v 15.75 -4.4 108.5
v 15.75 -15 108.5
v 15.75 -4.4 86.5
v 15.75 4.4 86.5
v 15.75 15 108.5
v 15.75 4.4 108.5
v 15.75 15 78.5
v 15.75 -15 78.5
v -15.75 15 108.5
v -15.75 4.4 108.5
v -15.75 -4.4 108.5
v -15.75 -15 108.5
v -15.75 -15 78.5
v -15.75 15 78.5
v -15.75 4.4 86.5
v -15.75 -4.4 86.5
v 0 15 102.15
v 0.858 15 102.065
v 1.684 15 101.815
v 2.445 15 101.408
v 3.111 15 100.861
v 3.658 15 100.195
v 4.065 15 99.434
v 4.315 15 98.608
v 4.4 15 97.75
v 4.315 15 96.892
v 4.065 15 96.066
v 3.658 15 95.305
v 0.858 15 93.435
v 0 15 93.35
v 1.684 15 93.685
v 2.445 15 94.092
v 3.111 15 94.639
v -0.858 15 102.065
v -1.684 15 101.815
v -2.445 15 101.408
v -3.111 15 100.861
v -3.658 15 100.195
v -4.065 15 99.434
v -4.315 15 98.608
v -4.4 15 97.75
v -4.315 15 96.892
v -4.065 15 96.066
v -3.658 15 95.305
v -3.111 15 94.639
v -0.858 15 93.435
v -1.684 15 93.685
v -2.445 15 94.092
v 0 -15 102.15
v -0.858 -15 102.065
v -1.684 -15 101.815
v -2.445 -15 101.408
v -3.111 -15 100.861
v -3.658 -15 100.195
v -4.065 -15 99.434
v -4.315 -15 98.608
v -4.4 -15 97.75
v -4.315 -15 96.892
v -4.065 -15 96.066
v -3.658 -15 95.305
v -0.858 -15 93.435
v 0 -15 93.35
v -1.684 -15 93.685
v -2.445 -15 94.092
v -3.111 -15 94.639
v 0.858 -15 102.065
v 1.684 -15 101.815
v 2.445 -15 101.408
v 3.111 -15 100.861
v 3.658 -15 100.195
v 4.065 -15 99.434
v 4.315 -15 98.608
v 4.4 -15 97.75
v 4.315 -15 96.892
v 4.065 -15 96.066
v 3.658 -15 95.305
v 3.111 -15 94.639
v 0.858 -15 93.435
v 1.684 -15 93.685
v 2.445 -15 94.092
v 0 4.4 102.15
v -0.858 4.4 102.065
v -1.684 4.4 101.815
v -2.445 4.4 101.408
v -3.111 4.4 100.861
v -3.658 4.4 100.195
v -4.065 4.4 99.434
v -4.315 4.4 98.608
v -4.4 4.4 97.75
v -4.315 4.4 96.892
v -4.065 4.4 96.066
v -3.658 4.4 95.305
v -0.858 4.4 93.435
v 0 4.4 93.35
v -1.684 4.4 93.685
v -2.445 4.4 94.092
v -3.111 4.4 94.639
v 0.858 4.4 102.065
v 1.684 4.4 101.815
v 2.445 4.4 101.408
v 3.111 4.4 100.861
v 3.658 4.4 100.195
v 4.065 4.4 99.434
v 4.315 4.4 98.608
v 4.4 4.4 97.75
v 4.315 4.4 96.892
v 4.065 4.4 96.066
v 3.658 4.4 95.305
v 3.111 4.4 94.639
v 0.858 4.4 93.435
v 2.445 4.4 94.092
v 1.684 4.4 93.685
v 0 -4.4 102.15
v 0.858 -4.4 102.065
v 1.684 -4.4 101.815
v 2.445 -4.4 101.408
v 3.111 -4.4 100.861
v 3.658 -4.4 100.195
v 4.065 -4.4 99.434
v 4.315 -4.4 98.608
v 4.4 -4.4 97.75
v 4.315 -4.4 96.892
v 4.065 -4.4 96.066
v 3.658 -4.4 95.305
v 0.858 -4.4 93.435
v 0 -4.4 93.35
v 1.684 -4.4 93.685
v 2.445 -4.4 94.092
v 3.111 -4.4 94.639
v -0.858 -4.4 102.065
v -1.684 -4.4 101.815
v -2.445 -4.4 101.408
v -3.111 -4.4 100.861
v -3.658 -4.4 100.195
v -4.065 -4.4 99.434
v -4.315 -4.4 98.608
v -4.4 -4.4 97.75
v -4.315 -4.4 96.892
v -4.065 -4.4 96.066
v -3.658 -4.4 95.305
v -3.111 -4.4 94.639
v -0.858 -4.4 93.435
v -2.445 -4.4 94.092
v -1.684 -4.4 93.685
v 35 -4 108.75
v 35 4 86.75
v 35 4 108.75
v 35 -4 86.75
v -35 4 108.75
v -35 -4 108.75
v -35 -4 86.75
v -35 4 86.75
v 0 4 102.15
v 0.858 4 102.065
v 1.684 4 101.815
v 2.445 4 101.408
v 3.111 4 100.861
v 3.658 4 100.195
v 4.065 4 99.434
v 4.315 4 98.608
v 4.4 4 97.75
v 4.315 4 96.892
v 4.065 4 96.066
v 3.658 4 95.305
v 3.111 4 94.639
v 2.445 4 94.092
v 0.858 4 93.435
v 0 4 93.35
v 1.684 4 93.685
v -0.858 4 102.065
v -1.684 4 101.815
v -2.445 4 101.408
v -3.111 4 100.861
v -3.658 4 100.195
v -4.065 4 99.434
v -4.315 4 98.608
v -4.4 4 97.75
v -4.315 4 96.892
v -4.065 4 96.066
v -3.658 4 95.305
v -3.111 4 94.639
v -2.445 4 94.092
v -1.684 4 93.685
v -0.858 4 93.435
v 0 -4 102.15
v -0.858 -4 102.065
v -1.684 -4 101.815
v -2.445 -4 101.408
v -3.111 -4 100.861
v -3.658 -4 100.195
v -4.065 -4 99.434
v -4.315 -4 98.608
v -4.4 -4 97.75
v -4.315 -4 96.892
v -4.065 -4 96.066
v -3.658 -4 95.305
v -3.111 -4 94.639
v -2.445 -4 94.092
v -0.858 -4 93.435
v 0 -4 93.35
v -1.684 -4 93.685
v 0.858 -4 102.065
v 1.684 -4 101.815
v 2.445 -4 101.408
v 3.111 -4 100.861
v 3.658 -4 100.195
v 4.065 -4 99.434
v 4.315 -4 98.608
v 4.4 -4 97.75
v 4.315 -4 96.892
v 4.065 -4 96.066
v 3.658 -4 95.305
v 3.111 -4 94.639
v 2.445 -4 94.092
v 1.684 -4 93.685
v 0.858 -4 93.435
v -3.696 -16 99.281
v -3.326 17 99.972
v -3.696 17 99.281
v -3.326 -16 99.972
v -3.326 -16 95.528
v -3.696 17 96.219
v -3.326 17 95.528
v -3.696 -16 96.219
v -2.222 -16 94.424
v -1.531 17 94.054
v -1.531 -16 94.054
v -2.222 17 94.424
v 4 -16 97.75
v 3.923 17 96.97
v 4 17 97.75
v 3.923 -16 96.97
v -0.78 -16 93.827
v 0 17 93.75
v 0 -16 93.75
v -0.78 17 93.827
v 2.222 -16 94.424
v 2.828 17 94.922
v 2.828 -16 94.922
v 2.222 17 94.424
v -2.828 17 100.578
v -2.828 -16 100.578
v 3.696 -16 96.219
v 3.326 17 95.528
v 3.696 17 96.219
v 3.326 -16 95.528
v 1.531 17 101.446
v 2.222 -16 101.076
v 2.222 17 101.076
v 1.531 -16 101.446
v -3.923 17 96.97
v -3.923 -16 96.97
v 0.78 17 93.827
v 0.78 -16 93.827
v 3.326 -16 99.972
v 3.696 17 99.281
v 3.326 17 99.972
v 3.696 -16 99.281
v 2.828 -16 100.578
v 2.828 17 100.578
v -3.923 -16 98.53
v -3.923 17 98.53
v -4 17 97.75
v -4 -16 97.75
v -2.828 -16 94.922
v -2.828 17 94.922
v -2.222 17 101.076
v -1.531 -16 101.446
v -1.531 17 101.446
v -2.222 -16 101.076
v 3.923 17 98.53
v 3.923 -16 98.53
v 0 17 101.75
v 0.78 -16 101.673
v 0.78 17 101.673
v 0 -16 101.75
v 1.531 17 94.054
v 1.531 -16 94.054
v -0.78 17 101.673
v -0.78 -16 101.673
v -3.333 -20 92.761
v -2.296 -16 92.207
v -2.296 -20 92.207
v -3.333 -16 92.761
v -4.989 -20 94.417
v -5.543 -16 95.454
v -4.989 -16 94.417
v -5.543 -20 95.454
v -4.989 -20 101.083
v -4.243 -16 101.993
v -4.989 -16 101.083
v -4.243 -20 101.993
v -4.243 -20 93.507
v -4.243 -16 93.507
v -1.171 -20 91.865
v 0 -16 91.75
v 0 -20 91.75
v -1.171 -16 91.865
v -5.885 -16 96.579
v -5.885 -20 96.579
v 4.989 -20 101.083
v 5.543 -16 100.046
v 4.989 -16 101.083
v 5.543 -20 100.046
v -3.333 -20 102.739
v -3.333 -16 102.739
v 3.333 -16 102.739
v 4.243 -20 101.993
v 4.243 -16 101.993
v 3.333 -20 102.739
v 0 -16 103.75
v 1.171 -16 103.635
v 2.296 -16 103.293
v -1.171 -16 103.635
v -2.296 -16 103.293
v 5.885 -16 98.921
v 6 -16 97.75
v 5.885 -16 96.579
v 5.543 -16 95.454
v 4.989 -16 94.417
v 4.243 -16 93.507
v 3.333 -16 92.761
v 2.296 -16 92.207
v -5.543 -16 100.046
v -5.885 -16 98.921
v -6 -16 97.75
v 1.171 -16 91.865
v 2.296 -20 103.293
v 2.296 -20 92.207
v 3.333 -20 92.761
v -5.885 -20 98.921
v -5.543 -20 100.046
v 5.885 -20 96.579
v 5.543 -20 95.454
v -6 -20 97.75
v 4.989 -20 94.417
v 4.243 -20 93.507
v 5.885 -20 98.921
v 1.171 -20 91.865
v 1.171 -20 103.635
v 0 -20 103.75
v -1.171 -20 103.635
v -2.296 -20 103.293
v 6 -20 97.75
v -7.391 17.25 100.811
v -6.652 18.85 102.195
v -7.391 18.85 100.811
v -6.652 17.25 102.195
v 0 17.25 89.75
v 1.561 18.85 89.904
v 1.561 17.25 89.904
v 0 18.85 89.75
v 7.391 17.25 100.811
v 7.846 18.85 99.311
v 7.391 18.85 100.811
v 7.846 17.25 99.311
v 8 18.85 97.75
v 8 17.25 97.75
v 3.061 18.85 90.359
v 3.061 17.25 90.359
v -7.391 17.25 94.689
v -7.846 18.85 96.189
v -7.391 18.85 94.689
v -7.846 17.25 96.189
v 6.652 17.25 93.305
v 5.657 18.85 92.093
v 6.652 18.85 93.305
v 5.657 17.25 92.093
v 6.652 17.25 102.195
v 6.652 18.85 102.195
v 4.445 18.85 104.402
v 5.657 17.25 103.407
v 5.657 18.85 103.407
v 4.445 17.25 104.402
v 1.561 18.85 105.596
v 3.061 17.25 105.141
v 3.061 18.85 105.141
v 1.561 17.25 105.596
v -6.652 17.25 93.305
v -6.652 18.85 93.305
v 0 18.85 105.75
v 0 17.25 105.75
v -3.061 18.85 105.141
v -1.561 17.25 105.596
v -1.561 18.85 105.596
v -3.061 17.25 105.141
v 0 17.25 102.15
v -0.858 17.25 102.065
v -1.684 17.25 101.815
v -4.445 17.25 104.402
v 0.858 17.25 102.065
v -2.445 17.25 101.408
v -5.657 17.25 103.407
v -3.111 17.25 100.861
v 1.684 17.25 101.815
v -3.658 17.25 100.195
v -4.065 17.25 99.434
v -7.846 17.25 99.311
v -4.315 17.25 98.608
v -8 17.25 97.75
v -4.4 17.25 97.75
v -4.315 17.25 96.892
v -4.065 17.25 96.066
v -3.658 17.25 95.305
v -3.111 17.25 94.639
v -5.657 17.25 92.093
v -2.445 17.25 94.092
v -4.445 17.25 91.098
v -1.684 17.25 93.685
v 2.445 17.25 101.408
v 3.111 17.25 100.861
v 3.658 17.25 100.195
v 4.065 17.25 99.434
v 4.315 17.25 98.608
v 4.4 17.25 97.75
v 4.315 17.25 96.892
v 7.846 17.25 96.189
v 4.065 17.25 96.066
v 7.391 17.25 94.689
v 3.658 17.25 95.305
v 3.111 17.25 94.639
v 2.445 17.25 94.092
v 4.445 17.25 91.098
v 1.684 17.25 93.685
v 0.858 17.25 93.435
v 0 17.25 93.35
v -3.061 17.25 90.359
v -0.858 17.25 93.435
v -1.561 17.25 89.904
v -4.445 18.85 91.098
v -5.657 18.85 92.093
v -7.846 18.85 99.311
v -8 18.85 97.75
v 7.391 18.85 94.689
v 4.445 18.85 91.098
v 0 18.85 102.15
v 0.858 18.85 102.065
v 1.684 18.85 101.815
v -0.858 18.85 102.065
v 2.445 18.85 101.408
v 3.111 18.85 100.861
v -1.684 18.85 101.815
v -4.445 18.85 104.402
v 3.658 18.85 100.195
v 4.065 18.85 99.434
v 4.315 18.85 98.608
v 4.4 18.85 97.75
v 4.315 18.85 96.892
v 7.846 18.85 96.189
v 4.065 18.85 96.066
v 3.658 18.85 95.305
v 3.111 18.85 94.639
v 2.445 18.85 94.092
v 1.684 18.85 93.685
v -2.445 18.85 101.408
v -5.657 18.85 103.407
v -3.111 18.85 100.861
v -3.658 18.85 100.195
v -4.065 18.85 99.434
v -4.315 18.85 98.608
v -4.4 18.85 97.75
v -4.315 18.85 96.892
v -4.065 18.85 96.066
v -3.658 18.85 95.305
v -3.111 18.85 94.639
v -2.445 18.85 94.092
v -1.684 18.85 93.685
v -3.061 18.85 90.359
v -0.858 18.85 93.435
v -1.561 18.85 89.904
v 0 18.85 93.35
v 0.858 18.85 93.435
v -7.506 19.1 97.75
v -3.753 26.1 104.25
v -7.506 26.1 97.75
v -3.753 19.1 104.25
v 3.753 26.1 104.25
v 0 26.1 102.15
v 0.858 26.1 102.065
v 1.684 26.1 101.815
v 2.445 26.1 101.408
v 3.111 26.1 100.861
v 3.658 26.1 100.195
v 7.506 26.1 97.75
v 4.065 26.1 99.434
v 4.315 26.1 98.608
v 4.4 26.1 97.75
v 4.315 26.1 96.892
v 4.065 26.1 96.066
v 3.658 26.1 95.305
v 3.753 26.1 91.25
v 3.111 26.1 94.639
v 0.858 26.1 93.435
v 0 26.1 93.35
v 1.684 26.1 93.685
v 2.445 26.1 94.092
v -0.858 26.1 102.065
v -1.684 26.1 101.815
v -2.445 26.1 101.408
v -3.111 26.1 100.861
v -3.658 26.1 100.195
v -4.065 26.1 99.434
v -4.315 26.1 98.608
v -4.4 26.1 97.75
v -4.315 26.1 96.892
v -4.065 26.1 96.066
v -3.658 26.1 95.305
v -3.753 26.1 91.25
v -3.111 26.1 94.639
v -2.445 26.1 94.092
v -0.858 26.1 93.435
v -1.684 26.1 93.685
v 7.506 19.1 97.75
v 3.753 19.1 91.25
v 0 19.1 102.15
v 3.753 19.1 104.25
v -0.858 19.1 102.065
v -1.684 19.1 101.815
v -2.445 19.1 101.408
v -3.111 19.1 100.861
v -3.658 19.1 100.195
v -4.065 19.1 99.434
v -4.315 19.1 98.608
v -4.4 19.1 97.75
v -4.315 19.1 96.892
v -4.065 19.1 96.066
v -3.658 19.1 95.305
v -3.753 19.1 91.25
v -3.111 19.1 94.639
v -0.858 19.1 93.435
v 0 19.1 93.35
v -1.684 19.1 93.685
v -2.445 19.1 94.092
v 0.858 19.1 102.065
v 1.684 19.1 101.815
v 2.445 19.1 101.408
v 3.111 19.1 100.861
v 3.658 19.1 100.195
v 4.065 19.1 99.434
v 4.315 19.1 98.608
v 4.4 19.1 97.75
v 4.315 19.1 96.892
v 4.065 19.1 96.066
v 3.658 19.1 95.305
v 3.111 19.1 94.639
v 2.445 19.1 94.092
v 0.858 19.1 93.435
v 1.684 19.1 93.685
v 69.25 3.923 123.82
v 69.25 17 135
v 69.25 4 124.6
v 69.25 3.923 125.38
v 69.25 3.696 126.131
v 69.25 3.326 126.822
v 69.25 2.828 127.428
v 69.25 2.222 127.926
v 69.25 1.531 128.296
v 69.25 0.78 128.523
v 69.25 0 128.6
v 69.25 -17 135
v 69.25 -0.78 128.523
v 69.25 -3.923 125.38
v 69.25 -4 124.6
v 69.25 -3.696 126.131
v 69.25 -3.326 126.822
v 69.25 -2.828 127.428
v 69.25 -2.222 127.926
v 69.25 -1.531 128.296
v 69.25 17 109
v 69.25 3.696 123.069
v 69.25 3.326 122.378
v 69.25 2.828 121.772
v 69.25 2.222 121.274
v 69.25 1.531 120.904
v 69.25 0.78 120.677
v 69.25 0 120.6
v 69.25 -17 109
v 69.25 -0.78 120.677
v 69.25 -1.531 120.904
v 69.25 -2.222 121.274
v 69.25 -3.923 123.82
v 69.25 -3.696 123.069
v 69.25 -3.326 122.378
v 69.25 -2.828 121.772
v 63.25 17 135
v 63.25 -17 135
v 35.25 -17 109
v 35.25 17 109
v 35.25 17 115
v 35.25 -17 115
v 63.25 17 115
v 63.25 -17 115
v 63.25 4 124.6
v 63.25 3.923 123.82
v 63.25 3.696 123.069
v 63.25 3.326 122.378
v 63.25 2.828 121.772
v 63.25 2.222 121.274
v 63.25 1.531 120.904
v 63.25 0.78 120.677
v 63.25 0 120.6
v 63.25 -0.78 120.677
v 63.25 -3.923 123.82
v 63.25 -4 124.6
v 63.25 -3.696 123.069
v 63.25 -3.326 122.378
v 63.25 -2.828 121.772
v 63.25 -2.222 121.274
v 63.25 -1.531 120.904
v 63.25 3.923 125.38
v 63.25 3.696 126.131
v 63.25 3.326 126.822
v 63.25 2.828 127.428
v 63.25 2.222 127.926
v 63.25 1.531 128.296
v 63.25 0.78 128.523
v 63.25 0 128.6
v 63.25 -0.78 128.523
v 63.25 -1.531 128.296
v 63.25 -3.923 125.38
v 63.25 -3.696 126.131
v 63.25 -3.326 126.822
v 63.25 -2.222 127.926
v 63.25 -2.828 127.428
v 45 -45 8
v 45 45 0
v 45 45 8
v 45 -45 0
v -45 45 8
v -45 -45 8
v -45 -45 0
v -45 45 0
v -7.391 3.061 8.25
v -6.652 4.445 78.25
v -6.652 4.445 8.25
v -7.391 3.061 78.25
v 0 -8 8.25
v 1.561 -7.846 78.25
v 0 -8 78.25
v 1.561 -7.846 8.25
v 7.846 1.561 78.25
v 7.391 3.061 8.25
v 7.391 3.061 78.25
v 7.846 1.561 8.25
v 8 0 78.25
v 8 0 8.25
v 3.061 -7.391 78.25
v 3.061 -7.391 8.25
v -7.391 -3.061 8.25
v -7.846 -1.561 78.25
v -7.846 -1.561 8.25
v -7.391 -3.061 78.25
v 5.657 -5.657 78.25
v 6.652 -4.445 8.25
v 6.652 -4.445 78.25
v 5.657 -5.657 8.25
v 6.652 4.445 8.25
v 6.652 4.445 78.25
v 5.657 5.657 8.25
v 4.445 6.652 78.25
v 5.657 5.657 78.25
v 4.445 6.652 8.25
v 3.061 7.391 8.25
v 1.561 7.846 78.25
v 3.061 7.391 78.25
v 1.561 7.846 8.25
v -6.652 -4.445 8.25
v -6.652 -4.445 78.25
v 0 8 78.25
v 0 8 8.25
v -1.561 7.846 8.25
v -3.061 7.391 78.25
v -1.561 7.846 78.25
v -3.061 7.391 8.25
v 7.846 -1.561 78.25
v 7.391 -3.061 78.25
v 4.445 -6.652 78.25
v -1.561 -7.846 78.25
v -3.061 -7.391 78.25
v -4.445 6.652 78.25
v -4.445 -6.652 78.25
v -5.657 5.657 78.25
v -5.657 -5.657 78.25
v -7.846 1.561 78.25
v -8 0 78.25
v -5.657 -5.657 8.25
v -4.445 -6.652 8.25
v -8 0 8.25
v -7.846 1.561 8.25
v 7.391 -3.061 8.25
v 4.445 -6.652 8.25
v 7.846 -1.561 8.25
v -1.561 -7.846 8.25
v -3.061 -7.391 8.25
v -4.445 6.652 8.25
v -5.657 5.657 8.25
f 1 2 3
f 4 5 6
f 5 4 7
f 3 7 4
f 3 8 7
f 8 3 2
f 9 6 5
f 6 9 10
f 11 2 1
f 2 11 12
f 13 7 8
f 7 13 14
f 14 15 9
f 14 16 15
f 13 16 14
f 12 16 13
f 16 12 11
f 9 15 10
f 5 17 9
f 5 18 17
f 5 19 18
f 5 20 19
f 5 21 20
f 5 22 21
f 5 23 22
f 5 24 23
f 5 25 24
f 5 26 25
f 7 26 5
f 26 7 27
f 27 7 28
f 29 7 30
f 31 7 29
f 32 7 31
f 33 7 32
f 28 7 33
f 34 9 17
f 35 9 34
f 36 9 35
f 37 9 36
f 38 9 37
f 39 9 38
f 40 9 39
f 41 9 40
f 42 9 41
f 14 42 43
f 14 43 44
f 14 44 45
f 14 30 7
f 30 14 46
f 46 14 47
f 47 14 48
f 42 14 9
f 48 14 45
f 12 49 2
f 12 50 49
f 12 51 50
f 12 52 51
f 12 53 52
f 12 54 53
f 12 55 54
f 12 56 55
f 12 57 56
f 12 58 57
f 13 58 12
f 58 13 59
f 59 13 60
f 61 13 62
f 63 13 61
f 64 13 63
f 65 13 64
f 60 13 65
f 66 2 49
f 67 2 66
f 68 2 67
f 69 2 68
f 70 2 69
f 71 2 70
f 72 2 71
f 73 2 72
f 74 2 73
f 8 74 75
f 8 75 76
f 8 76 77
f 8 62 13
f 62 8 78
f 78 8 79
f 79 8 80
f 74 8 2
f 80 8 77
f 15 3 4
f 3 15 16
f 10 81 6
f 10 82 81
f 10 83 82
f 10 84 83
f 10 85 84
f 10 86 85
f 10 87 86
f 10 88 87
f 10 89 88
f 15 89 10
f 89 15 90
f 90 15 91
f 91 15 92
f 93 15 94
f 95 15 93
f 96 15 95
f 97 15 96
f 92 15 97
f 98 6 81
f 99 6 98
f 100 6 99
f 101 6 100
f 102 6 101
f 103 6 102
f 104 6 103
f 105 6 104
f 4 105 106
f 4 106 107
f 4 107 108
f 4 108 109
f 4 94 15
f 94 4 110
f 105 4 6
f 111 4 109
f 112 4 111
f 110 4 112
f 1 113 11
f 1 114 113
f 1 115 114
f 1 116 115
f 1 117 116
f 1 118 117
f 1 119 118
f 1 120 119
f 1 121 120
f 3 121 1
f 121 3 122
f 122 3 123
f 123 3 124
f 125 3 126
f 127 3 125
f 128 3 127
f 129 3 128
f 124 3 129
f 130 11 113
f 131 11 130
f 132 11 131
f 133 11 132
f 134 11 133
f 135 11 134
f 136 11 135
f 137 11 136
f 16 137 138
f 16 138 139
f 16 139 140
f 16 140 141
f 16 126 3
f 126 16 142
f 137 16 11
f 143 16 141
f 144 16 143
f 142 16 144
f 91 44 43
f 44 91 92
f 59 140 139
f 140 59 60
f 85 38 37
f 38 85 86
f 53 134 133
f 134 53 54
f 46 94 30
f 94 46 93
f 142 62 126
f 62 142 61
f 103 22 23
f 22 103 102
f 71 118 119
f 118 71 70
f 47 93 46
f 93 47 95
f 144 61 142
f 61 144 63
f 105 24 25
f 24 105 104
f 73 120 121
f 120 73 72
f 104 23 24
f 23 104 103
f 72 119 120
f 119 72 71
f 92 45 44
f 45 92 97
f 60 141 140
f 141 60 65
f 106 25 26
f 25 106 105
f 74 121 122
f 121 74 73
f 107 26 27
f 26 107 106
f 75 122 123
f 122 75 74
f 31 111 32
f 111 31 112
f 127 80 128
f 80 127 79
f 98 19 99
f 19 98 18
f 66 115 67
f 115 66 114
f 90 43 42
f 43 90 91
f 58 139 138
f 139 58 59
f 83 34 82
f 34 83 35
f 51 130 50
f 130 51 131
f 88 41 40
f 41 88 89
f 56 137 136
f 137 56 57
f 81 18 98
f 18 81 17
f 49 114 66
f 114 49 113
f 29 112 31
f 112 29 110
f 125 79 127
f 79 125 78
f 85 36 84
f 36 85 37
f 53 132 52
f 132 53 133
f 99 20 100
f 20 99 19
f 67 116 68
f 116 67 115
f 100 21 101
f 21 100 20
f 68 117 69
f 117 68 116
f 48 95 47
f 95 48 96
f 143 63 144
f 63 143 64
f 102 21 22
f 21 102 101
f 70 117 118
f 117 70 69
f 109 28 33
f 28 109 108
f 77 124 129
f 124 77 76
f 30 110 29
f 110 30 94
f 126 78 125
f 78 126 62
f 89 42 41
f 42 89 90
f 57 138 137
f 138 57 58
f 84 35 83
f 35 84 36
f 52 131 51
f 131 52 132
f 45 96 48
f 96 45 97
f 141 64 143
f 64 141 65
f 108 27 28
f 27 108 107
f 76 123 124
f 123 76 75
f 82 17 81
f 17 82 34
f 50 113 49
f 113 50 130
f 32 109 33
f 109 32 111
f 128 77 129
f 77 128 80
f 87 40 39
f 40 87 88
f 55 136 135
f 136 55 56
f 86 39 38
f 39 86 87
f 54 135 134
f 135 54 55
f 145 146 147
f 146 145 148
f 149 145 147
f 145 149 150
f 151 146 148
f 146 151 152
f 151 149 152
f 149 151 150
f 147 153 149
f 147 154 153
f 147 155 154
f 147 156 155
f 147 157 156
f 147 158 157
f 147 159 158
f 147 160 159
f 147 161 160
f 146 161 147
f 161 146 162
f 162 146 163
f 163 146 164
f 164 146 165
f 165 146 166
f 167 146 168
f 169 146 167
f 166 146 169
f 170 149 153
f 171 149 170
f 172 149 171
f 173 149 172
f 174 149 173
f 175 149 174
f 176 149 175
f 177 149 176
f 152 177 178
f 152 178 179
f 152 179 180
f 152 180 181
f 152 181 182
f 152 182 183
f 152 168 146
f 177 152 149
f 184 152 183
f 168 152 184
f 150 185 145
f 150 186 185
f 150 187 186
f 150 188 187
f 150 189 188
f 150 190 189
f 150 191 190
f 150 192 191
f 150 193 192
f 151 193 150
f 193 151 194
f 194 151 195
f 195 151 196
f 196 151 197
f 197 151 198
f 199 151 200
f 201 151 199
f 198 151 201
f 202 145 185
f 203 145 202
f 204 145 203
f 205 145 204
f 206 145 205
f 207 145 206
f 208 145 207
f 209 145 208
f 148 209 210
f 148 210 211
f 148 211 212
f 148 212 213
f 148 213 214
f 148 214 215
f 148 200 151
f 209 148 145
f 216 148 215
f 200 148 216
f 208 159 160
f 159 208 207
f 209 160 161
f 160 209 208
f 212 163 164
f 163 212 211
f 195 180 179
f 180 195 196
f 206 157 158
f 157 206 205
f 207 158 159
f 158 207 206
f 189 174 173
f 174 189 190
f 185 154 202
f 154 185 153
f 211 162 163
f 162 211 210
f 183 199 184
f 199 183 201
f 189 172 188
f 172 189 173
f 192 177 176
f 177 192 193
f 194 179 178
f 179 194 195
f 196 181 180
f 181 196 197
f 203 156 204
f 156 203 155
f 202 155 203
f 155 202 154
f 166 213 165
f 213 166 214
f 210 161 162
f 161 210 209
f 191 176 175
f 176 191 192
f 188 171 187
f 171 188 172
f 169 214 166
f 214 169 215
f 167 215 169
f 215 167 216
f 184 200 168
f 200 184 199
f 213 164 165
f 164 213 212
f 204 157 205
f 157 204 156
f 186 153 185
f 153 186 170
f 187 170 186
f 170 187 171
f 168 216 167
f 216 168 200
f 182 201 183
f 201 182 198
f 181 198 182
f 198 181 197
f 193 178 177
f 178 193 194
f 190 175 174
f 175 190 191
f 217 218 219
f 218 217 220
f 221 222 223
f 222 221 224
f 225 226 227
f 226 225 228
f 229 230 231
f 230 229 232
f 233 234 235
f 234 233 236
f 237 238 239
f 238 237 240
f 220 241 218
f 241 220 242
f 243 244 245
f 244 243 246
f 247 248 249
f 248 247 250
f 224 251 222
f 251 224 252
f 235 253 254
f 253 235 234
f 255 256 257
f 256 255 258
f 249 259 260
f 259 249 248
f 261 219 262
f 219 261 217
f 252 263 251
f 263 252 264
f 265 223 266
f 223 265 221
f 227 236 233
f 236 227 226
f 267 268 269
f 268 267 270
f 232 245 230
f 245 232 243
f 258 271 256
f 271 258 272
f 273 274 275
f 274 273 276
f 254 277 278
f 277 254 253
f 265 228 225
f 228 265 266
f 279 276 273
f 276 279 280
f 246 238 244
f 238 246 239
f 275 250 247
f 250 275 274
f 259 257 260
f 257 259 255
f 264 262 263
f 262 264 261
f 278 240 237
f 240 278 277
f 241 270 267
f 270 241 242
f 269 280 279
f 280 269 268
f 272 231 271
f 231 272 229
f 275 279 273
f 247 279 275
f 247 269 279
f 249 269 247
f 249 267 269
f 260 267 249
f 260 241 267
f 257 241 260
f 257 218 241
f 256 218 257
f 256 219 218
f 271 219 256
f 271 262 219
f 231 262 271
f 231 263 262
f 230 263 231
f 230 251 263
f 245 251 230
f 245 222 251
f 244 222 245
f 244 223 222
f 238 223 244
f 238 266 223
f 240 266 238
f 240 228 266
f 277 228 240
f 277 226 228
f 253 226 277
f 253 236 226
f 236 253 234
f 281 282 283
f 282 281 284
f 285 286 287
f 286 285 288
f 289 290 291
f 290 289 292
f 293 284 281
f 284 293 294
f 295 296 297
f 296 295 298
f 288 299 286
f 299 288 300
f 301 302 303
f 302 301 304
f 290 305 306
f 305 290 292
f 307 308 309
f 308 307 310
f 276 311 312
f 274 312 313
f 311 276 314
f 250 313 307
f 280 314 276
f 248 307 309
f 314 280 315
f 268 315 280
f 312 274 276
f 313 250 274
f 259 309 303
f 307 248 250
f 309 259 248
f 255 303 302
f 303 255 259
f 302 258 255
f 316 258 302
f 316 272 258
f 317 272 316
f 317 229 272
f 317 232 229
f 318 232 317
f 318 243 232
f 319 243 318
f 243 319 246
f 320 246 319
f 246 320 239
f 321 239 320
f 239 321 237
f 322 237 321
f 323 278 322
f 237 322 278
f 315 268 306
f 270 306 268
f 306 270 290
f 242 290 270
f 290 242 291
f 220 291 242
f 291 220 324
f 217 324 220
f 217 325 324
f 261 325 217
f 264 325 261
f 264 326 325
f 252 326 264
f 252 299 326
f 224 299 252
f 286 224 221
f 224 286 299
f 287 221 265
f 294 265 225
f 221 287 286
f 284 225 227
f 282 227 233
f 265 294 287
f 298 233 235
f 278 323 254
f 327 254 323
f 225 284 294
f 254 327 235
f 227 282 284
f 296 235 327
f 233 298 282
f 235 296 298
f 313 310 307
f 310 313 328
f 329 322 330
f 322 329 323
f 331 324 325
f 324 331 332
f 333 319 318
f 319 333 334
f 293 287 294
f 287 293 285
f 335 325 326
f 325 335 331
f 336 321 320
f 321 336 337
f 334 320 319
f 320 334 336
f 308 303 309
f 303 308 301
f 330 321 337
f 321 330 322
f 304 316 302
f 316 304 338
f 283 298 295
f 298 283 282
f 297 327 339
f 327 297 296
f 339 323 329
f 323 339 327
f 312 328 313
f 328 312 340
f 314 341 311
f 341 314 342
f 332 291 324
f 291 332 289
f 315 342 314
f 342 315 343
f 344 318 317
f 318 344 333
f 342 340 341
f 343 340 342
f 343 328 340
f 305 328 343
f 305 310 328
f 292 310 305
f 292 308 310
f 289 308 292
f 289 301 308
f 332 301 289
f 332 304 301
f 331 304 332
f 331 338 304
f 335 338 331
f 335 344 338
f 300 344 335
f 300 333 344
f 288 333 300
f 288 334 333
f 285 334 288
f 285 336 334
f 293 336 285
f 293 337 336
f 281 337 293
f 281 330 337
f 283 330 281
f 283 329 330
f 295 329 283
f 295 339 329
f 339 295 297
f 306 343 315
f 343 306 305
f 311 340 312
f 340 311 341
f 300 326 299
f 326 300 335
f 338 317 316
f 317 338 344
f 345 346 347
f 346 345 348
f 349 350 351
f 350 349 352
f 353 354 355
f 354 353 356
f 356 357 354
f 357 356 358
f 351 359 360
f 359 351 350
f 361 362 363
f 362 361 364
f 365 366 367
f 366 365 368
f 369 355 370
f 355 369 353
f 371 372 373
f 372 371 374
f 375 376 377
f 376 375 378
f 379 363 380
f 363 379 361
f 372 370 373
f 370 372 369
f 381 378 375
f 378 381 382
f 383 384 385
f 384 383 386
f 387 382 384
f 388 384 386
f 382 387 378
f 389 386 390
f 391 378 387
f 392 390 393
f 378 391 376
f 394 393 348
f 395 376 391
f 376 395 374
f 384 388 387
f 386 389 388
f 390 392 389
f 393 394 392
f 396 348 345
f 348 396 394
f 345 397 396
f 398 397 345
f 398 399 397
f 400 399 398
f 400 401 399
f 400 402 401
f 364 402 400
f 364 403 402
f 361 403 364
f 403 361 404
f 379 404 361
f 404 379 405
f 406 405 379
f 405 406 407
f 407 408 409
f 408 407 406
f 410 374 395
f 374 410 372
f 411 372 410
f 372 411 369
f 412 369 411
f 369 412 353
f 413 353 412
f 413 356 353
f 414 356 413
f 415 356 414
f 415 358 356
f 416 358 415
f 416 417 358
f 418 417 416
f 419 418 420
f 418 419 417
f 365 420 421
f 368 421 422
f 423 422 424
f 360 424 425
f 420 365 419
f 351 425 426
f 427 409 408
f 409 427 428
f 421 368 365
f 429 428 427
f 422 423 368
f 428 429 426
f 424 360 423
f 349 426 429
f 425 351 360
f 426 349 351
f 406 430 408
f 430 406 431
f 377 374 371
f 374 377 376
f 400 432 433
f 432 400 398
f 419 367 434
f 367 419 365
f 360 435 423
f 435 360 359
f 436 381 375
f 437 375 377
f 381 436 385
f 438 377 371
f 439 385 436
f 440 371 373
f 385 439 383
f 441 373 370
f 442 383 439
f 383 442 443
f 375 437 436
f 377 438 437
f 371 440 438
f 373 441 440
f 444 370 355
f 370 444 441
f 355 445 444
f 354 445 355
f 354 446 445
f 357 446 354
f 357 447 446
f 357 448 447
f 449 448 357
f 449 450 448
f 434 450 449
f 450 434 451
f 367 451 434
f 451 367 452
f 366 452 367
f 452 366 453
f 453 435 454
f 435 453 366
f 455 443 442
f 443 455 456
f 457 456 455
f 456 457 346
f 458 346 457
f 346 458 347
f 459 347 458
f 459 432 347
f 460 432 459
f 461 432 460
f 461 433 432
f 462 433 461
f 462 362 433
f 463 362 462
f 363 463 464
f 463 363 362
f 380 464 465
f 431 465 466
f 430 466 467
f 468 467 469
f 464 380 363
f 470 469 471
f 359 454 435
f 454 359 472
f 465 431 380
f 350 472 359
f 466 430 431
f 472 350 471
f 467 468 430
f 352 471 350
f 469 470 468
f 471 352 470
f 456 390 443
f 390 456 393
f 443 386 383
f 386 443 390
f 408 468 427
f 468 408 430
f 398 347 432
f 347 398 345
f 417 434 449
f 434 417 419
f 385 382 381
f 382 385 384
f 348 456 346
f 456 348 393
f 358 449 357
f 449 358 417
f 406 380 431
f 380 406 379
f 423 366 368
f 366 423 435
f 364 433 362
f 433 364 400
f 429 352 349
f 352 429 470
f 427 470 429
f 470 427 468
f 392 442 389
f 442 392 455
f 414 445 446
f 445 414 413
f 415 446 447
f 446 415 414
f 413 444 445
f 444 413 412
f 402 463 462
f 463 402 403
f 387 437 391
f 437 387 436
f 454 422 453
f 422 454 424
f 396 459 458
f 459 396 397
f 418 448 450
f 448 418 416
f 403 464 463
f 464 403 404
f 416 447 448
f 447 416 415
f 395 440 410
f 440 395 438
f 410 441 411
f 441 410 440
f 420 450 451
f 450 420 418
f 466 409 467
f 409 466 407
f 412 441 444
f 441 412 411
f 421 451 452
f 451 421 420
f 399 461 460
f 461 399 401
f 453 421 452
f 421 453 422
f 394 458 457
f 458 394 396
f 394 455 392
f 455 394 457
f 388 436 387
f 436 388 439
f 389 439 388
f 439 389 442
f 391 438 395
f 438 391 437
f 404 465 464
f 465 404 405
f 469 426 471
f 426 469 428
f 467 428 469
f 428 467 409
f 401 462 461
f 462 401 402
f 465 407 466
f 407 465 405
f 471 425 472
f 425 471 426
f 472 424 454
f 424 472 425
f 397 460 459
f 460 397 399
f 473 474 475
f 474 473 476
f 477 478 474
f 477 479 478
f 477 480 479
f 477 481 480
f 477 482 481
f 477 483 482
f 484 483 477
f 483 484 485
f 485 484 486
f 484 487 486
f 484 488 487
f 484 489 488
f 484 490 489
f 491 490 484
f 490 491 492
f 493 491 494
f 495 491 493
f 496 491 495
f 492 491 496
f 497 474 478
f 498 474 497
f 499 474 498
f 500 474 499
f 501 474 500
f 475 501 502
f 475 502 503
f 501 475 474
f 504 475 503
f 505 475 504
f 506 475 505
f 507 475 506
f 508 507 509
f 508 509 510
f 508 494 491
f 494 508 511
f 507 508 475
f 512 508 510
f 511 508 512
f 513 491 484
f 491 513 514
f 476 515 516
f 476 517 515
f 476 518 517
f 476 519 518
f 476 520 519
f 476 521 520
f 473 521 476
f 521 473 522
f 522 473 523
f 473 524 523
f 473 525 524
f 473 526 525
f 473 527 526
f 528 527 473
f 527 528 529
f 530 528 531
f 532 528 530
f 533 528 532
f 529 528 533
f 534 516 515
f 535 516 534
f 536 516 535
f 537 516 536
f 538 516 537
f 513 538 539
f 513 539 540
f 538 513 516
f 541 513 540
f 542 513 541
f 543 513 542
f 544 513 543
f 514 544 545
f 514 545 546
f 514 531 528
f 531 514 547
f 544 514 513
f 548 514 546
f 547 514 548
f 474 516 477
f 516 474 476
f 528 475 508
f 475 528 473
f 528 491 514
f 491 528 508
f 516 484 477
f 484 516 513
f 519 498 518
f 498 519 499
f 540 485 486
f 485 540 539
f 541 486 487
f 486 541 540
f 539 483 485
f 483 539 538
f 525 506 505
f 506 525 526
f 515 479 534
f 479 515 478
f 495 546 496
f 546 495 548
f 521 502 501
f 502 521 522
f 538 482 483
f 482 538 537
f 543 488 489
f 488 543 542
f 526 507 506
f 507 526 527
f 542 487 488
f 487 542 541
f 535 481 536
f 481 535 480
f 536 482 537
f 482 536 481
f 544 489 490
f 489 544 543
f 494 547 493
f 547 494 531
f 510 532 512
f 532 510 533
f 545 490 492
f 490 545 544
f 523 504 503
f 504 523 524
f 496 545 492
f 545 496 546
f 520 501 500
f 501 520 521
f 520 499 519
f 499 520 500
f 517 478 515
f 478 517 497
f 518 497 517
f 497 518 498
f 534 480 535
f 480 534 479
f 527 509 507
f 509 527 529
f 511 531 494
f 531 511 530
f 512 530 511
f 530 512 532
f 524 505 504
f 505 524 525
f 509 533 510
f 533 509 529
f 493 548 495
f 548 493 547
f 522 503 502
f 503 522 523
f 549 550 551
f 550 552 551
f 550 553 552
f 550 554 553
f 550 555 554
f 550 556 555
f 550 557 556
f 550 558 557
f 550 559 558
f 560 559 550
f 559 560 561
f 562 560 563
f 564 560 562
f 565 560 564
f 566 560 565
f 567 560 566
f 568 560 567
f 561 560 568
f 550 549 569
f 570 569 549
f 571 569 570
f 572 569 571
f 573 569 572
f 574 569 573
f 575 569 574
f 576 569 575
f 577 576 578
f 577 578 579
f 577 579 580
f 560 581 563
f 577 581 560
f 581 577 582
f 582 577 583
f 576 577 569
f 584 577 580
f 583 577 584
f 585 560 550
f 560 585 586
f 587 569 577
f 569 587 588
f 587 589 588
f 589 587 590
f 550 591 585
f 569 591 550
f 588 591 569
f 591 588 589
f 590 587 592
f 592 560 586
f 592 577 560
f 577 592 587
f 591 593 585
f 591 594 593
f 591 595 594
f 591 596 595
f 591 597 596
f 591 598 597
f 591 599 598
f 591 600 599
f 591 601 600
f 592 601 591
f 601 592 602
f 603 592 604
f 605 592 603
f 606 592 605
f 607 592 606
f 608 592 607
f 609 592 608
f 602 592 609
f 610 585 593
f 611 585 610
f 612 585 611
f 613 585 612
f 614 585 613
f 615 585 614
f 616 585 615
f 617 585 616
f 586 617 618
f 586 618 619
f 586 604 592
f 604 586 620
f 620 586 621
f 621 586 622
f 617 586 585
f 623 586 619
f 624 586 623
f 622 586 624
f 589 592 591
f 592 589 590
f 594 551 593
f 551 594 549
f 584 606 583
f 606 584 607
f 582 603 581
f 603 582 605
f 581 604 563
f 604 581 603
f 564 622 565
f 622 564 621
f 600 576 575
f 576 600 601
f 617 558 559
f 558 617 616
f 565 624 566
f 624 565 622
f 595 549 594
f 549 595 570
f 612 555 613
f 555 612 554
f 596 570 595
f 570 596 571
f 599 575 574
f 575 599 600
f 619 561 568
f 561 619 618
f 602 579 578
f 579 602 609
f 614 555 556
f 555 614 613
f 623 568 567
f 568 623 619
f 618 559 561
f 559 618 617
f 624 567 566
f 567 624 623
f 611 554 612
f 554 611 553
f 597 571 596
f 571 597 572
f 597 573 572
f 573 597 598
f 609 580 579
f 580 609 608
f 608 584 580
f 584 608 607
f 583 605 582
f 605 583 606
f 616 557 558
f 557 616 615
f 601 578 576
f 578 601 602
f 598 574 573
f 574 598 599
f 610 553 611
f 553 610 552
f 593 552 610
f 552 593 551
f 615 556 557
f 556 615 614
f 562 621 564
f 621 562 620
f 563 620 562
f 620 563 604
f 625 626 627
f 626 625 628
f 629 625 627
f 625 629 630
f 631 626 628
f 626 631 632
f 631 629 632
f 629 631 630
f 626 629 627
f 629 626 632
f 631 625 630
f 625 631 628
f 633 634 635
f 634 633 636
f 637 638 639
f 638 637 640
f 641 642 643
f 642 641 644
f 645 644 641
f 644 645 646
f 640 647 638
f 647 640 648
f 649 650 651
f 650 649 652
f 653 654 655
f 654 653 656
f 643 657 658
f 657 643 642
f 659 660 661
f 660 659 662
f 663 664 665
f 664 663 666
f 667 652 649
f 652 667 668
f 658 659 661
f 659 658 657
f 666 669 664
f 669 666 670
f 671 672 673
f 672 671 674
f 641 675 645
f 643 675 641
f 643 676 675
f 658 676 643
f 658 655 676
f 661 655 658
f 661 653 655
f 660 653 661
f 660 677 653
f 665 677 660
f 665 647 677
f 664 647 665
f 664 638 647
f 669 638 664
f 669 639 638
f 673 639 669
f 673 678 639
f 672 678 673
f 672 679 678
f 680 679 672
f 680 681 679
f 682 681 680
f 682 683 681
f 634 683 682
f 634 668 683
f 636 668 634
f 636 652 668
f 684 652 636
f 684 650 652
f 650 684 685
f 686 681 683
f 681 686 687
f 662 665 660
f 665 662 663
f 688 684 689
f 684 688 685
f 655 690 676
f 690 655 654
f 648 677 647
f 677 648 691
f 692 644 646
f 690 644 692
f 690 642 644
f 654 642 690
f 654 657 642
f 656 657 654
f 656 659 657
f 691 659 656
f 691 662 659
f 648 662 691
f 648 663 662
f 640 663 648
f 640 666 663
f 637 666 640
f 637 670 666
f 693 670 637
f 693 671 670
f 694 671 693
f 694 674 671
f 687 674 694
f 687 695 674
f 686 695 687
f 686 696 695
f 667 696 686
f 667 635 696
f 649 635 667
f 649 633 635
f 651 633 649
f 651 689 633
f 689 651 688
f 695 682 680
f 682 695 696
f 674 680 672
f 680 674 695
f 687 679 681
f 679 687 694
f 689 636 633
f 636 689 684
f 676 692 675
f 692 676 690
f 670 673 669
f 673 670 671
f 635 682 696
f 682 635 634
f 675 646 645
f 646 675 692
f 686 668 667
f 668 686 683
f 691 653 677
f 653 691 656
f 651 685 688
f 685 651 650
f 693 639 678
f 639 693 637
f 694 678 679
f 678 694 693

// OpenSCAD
$fn = 32;

// ------------------------------------------------------------------------
// Lamp arm: column d16 x 70 mm, arm 70 mm
// Every part is its own module, assembly() places every instance.
// ------------------------------------------------------------------------

// --- part 1 ---
module lamp_base() {
  difference() {
    translate([-45, -45, 0]) cube([90, 90, 8]);
  }
}

// --- part 2 ---
module lamp_column() {
  cylinder(h = 70, d = 16);
}

// --- part 3 ---
module head_fork() {
  difference() {
    translate([-15.75, -15, 0]) cube([31.5, 30, 30]);
    translate([-16.75, -4.4, 8]) cube([33.5, 8.8, 23]);
    translate([0, 0, 19.25]) rotate([90, 0, 0]) cylinder(h = 32, d = 8.8, center = true);
  }
}

// --- part 4 ---
module lamp_arm() {
  difference() {
    translate([-35, -4, 0]) cube([70, 8, 22]);
    translate([0, 0, 11]) rotate([90, 0, 0]) cylinder(h = 10, d = 8.8, center = true);
  }
}

// --- part 5 ---
module arm_pin() {
  rotate([0, 90, 0]) cylinder(h = 34, d = 8, center = true);
  translate([-20, 0, 0]) rotate([0, 90, 0]) cylinder(h = 4, d = 12);
}

// --- part 6 ---
module arm_washer() {
  difference() {
      translate([0, 0, 0]) cylinder(h = 1.6, d = 16);
      translate([0, 0, -1]) cylinder(h = 3.6, d = 8.8);
    }
}

// --- part 7 ---
module arm_nut() {
  difference() {
    linear_extrude(height = 7) polygon(points = [[7.506, 0], [3.753, 6.5], [-3.753, 6.5], [-7.506, 0], [-3.753, -6.5], [3.753, -6.5]]);
    translate([0, 0, -1]) cylinder(h = 9, d = 8.8);
  }
}

// --- part 8 ---
module shade_bracket() {
  difference() {
    translate([-17, -17, 0]) cube([34, 34, 26]);
    translate([-18, -18, 6]) cube([29, 36, 21]);
    translate([14, 0, 15.6]) rotate([0, 90, 0]) cylinder(h = 8, d = 8, center = true);
  }
}

// --- assembly ---
module assembly() {
  color([0.80, 0.24, 0.20]) translate([0, 0, 0]) rotate([0, 0, 0]) lamp_base();
  color([0.20, 0.45, 0.75]) translate([0, 0, 8.25]) rotate([0, 0, 0]) lamp_column();
  color([0.25, 0.62, 0.32]) translate([0, 0, 78.5]) rotate([0, 0, 0]) head_fork();
  color([0.92, 0.70, 0.18]) translate([0, 0, 86.75]) rotate([0, 0, 0]) lamp_arm();
  color([0.58, 0.35, 0.70]) translate([0, 0, 97.75]) rotate([0, 0, 90]) arm_pin();
  color([0.16, 0.66, 0.66]) translate([0, 18.85, 97.75]) rotate([90, 0, 0]) arm_washer();
  color([0.85, 0.48, 0.18]) translate([0, 26.1, 97.75]) rotate([90, 0, 0]) arm_nut();
  color([0.55, 0.60, 0.65]) translate([52.25, 0, 109]) rotate([0, 0, 0]) shade_bracket();
}

assembly();
